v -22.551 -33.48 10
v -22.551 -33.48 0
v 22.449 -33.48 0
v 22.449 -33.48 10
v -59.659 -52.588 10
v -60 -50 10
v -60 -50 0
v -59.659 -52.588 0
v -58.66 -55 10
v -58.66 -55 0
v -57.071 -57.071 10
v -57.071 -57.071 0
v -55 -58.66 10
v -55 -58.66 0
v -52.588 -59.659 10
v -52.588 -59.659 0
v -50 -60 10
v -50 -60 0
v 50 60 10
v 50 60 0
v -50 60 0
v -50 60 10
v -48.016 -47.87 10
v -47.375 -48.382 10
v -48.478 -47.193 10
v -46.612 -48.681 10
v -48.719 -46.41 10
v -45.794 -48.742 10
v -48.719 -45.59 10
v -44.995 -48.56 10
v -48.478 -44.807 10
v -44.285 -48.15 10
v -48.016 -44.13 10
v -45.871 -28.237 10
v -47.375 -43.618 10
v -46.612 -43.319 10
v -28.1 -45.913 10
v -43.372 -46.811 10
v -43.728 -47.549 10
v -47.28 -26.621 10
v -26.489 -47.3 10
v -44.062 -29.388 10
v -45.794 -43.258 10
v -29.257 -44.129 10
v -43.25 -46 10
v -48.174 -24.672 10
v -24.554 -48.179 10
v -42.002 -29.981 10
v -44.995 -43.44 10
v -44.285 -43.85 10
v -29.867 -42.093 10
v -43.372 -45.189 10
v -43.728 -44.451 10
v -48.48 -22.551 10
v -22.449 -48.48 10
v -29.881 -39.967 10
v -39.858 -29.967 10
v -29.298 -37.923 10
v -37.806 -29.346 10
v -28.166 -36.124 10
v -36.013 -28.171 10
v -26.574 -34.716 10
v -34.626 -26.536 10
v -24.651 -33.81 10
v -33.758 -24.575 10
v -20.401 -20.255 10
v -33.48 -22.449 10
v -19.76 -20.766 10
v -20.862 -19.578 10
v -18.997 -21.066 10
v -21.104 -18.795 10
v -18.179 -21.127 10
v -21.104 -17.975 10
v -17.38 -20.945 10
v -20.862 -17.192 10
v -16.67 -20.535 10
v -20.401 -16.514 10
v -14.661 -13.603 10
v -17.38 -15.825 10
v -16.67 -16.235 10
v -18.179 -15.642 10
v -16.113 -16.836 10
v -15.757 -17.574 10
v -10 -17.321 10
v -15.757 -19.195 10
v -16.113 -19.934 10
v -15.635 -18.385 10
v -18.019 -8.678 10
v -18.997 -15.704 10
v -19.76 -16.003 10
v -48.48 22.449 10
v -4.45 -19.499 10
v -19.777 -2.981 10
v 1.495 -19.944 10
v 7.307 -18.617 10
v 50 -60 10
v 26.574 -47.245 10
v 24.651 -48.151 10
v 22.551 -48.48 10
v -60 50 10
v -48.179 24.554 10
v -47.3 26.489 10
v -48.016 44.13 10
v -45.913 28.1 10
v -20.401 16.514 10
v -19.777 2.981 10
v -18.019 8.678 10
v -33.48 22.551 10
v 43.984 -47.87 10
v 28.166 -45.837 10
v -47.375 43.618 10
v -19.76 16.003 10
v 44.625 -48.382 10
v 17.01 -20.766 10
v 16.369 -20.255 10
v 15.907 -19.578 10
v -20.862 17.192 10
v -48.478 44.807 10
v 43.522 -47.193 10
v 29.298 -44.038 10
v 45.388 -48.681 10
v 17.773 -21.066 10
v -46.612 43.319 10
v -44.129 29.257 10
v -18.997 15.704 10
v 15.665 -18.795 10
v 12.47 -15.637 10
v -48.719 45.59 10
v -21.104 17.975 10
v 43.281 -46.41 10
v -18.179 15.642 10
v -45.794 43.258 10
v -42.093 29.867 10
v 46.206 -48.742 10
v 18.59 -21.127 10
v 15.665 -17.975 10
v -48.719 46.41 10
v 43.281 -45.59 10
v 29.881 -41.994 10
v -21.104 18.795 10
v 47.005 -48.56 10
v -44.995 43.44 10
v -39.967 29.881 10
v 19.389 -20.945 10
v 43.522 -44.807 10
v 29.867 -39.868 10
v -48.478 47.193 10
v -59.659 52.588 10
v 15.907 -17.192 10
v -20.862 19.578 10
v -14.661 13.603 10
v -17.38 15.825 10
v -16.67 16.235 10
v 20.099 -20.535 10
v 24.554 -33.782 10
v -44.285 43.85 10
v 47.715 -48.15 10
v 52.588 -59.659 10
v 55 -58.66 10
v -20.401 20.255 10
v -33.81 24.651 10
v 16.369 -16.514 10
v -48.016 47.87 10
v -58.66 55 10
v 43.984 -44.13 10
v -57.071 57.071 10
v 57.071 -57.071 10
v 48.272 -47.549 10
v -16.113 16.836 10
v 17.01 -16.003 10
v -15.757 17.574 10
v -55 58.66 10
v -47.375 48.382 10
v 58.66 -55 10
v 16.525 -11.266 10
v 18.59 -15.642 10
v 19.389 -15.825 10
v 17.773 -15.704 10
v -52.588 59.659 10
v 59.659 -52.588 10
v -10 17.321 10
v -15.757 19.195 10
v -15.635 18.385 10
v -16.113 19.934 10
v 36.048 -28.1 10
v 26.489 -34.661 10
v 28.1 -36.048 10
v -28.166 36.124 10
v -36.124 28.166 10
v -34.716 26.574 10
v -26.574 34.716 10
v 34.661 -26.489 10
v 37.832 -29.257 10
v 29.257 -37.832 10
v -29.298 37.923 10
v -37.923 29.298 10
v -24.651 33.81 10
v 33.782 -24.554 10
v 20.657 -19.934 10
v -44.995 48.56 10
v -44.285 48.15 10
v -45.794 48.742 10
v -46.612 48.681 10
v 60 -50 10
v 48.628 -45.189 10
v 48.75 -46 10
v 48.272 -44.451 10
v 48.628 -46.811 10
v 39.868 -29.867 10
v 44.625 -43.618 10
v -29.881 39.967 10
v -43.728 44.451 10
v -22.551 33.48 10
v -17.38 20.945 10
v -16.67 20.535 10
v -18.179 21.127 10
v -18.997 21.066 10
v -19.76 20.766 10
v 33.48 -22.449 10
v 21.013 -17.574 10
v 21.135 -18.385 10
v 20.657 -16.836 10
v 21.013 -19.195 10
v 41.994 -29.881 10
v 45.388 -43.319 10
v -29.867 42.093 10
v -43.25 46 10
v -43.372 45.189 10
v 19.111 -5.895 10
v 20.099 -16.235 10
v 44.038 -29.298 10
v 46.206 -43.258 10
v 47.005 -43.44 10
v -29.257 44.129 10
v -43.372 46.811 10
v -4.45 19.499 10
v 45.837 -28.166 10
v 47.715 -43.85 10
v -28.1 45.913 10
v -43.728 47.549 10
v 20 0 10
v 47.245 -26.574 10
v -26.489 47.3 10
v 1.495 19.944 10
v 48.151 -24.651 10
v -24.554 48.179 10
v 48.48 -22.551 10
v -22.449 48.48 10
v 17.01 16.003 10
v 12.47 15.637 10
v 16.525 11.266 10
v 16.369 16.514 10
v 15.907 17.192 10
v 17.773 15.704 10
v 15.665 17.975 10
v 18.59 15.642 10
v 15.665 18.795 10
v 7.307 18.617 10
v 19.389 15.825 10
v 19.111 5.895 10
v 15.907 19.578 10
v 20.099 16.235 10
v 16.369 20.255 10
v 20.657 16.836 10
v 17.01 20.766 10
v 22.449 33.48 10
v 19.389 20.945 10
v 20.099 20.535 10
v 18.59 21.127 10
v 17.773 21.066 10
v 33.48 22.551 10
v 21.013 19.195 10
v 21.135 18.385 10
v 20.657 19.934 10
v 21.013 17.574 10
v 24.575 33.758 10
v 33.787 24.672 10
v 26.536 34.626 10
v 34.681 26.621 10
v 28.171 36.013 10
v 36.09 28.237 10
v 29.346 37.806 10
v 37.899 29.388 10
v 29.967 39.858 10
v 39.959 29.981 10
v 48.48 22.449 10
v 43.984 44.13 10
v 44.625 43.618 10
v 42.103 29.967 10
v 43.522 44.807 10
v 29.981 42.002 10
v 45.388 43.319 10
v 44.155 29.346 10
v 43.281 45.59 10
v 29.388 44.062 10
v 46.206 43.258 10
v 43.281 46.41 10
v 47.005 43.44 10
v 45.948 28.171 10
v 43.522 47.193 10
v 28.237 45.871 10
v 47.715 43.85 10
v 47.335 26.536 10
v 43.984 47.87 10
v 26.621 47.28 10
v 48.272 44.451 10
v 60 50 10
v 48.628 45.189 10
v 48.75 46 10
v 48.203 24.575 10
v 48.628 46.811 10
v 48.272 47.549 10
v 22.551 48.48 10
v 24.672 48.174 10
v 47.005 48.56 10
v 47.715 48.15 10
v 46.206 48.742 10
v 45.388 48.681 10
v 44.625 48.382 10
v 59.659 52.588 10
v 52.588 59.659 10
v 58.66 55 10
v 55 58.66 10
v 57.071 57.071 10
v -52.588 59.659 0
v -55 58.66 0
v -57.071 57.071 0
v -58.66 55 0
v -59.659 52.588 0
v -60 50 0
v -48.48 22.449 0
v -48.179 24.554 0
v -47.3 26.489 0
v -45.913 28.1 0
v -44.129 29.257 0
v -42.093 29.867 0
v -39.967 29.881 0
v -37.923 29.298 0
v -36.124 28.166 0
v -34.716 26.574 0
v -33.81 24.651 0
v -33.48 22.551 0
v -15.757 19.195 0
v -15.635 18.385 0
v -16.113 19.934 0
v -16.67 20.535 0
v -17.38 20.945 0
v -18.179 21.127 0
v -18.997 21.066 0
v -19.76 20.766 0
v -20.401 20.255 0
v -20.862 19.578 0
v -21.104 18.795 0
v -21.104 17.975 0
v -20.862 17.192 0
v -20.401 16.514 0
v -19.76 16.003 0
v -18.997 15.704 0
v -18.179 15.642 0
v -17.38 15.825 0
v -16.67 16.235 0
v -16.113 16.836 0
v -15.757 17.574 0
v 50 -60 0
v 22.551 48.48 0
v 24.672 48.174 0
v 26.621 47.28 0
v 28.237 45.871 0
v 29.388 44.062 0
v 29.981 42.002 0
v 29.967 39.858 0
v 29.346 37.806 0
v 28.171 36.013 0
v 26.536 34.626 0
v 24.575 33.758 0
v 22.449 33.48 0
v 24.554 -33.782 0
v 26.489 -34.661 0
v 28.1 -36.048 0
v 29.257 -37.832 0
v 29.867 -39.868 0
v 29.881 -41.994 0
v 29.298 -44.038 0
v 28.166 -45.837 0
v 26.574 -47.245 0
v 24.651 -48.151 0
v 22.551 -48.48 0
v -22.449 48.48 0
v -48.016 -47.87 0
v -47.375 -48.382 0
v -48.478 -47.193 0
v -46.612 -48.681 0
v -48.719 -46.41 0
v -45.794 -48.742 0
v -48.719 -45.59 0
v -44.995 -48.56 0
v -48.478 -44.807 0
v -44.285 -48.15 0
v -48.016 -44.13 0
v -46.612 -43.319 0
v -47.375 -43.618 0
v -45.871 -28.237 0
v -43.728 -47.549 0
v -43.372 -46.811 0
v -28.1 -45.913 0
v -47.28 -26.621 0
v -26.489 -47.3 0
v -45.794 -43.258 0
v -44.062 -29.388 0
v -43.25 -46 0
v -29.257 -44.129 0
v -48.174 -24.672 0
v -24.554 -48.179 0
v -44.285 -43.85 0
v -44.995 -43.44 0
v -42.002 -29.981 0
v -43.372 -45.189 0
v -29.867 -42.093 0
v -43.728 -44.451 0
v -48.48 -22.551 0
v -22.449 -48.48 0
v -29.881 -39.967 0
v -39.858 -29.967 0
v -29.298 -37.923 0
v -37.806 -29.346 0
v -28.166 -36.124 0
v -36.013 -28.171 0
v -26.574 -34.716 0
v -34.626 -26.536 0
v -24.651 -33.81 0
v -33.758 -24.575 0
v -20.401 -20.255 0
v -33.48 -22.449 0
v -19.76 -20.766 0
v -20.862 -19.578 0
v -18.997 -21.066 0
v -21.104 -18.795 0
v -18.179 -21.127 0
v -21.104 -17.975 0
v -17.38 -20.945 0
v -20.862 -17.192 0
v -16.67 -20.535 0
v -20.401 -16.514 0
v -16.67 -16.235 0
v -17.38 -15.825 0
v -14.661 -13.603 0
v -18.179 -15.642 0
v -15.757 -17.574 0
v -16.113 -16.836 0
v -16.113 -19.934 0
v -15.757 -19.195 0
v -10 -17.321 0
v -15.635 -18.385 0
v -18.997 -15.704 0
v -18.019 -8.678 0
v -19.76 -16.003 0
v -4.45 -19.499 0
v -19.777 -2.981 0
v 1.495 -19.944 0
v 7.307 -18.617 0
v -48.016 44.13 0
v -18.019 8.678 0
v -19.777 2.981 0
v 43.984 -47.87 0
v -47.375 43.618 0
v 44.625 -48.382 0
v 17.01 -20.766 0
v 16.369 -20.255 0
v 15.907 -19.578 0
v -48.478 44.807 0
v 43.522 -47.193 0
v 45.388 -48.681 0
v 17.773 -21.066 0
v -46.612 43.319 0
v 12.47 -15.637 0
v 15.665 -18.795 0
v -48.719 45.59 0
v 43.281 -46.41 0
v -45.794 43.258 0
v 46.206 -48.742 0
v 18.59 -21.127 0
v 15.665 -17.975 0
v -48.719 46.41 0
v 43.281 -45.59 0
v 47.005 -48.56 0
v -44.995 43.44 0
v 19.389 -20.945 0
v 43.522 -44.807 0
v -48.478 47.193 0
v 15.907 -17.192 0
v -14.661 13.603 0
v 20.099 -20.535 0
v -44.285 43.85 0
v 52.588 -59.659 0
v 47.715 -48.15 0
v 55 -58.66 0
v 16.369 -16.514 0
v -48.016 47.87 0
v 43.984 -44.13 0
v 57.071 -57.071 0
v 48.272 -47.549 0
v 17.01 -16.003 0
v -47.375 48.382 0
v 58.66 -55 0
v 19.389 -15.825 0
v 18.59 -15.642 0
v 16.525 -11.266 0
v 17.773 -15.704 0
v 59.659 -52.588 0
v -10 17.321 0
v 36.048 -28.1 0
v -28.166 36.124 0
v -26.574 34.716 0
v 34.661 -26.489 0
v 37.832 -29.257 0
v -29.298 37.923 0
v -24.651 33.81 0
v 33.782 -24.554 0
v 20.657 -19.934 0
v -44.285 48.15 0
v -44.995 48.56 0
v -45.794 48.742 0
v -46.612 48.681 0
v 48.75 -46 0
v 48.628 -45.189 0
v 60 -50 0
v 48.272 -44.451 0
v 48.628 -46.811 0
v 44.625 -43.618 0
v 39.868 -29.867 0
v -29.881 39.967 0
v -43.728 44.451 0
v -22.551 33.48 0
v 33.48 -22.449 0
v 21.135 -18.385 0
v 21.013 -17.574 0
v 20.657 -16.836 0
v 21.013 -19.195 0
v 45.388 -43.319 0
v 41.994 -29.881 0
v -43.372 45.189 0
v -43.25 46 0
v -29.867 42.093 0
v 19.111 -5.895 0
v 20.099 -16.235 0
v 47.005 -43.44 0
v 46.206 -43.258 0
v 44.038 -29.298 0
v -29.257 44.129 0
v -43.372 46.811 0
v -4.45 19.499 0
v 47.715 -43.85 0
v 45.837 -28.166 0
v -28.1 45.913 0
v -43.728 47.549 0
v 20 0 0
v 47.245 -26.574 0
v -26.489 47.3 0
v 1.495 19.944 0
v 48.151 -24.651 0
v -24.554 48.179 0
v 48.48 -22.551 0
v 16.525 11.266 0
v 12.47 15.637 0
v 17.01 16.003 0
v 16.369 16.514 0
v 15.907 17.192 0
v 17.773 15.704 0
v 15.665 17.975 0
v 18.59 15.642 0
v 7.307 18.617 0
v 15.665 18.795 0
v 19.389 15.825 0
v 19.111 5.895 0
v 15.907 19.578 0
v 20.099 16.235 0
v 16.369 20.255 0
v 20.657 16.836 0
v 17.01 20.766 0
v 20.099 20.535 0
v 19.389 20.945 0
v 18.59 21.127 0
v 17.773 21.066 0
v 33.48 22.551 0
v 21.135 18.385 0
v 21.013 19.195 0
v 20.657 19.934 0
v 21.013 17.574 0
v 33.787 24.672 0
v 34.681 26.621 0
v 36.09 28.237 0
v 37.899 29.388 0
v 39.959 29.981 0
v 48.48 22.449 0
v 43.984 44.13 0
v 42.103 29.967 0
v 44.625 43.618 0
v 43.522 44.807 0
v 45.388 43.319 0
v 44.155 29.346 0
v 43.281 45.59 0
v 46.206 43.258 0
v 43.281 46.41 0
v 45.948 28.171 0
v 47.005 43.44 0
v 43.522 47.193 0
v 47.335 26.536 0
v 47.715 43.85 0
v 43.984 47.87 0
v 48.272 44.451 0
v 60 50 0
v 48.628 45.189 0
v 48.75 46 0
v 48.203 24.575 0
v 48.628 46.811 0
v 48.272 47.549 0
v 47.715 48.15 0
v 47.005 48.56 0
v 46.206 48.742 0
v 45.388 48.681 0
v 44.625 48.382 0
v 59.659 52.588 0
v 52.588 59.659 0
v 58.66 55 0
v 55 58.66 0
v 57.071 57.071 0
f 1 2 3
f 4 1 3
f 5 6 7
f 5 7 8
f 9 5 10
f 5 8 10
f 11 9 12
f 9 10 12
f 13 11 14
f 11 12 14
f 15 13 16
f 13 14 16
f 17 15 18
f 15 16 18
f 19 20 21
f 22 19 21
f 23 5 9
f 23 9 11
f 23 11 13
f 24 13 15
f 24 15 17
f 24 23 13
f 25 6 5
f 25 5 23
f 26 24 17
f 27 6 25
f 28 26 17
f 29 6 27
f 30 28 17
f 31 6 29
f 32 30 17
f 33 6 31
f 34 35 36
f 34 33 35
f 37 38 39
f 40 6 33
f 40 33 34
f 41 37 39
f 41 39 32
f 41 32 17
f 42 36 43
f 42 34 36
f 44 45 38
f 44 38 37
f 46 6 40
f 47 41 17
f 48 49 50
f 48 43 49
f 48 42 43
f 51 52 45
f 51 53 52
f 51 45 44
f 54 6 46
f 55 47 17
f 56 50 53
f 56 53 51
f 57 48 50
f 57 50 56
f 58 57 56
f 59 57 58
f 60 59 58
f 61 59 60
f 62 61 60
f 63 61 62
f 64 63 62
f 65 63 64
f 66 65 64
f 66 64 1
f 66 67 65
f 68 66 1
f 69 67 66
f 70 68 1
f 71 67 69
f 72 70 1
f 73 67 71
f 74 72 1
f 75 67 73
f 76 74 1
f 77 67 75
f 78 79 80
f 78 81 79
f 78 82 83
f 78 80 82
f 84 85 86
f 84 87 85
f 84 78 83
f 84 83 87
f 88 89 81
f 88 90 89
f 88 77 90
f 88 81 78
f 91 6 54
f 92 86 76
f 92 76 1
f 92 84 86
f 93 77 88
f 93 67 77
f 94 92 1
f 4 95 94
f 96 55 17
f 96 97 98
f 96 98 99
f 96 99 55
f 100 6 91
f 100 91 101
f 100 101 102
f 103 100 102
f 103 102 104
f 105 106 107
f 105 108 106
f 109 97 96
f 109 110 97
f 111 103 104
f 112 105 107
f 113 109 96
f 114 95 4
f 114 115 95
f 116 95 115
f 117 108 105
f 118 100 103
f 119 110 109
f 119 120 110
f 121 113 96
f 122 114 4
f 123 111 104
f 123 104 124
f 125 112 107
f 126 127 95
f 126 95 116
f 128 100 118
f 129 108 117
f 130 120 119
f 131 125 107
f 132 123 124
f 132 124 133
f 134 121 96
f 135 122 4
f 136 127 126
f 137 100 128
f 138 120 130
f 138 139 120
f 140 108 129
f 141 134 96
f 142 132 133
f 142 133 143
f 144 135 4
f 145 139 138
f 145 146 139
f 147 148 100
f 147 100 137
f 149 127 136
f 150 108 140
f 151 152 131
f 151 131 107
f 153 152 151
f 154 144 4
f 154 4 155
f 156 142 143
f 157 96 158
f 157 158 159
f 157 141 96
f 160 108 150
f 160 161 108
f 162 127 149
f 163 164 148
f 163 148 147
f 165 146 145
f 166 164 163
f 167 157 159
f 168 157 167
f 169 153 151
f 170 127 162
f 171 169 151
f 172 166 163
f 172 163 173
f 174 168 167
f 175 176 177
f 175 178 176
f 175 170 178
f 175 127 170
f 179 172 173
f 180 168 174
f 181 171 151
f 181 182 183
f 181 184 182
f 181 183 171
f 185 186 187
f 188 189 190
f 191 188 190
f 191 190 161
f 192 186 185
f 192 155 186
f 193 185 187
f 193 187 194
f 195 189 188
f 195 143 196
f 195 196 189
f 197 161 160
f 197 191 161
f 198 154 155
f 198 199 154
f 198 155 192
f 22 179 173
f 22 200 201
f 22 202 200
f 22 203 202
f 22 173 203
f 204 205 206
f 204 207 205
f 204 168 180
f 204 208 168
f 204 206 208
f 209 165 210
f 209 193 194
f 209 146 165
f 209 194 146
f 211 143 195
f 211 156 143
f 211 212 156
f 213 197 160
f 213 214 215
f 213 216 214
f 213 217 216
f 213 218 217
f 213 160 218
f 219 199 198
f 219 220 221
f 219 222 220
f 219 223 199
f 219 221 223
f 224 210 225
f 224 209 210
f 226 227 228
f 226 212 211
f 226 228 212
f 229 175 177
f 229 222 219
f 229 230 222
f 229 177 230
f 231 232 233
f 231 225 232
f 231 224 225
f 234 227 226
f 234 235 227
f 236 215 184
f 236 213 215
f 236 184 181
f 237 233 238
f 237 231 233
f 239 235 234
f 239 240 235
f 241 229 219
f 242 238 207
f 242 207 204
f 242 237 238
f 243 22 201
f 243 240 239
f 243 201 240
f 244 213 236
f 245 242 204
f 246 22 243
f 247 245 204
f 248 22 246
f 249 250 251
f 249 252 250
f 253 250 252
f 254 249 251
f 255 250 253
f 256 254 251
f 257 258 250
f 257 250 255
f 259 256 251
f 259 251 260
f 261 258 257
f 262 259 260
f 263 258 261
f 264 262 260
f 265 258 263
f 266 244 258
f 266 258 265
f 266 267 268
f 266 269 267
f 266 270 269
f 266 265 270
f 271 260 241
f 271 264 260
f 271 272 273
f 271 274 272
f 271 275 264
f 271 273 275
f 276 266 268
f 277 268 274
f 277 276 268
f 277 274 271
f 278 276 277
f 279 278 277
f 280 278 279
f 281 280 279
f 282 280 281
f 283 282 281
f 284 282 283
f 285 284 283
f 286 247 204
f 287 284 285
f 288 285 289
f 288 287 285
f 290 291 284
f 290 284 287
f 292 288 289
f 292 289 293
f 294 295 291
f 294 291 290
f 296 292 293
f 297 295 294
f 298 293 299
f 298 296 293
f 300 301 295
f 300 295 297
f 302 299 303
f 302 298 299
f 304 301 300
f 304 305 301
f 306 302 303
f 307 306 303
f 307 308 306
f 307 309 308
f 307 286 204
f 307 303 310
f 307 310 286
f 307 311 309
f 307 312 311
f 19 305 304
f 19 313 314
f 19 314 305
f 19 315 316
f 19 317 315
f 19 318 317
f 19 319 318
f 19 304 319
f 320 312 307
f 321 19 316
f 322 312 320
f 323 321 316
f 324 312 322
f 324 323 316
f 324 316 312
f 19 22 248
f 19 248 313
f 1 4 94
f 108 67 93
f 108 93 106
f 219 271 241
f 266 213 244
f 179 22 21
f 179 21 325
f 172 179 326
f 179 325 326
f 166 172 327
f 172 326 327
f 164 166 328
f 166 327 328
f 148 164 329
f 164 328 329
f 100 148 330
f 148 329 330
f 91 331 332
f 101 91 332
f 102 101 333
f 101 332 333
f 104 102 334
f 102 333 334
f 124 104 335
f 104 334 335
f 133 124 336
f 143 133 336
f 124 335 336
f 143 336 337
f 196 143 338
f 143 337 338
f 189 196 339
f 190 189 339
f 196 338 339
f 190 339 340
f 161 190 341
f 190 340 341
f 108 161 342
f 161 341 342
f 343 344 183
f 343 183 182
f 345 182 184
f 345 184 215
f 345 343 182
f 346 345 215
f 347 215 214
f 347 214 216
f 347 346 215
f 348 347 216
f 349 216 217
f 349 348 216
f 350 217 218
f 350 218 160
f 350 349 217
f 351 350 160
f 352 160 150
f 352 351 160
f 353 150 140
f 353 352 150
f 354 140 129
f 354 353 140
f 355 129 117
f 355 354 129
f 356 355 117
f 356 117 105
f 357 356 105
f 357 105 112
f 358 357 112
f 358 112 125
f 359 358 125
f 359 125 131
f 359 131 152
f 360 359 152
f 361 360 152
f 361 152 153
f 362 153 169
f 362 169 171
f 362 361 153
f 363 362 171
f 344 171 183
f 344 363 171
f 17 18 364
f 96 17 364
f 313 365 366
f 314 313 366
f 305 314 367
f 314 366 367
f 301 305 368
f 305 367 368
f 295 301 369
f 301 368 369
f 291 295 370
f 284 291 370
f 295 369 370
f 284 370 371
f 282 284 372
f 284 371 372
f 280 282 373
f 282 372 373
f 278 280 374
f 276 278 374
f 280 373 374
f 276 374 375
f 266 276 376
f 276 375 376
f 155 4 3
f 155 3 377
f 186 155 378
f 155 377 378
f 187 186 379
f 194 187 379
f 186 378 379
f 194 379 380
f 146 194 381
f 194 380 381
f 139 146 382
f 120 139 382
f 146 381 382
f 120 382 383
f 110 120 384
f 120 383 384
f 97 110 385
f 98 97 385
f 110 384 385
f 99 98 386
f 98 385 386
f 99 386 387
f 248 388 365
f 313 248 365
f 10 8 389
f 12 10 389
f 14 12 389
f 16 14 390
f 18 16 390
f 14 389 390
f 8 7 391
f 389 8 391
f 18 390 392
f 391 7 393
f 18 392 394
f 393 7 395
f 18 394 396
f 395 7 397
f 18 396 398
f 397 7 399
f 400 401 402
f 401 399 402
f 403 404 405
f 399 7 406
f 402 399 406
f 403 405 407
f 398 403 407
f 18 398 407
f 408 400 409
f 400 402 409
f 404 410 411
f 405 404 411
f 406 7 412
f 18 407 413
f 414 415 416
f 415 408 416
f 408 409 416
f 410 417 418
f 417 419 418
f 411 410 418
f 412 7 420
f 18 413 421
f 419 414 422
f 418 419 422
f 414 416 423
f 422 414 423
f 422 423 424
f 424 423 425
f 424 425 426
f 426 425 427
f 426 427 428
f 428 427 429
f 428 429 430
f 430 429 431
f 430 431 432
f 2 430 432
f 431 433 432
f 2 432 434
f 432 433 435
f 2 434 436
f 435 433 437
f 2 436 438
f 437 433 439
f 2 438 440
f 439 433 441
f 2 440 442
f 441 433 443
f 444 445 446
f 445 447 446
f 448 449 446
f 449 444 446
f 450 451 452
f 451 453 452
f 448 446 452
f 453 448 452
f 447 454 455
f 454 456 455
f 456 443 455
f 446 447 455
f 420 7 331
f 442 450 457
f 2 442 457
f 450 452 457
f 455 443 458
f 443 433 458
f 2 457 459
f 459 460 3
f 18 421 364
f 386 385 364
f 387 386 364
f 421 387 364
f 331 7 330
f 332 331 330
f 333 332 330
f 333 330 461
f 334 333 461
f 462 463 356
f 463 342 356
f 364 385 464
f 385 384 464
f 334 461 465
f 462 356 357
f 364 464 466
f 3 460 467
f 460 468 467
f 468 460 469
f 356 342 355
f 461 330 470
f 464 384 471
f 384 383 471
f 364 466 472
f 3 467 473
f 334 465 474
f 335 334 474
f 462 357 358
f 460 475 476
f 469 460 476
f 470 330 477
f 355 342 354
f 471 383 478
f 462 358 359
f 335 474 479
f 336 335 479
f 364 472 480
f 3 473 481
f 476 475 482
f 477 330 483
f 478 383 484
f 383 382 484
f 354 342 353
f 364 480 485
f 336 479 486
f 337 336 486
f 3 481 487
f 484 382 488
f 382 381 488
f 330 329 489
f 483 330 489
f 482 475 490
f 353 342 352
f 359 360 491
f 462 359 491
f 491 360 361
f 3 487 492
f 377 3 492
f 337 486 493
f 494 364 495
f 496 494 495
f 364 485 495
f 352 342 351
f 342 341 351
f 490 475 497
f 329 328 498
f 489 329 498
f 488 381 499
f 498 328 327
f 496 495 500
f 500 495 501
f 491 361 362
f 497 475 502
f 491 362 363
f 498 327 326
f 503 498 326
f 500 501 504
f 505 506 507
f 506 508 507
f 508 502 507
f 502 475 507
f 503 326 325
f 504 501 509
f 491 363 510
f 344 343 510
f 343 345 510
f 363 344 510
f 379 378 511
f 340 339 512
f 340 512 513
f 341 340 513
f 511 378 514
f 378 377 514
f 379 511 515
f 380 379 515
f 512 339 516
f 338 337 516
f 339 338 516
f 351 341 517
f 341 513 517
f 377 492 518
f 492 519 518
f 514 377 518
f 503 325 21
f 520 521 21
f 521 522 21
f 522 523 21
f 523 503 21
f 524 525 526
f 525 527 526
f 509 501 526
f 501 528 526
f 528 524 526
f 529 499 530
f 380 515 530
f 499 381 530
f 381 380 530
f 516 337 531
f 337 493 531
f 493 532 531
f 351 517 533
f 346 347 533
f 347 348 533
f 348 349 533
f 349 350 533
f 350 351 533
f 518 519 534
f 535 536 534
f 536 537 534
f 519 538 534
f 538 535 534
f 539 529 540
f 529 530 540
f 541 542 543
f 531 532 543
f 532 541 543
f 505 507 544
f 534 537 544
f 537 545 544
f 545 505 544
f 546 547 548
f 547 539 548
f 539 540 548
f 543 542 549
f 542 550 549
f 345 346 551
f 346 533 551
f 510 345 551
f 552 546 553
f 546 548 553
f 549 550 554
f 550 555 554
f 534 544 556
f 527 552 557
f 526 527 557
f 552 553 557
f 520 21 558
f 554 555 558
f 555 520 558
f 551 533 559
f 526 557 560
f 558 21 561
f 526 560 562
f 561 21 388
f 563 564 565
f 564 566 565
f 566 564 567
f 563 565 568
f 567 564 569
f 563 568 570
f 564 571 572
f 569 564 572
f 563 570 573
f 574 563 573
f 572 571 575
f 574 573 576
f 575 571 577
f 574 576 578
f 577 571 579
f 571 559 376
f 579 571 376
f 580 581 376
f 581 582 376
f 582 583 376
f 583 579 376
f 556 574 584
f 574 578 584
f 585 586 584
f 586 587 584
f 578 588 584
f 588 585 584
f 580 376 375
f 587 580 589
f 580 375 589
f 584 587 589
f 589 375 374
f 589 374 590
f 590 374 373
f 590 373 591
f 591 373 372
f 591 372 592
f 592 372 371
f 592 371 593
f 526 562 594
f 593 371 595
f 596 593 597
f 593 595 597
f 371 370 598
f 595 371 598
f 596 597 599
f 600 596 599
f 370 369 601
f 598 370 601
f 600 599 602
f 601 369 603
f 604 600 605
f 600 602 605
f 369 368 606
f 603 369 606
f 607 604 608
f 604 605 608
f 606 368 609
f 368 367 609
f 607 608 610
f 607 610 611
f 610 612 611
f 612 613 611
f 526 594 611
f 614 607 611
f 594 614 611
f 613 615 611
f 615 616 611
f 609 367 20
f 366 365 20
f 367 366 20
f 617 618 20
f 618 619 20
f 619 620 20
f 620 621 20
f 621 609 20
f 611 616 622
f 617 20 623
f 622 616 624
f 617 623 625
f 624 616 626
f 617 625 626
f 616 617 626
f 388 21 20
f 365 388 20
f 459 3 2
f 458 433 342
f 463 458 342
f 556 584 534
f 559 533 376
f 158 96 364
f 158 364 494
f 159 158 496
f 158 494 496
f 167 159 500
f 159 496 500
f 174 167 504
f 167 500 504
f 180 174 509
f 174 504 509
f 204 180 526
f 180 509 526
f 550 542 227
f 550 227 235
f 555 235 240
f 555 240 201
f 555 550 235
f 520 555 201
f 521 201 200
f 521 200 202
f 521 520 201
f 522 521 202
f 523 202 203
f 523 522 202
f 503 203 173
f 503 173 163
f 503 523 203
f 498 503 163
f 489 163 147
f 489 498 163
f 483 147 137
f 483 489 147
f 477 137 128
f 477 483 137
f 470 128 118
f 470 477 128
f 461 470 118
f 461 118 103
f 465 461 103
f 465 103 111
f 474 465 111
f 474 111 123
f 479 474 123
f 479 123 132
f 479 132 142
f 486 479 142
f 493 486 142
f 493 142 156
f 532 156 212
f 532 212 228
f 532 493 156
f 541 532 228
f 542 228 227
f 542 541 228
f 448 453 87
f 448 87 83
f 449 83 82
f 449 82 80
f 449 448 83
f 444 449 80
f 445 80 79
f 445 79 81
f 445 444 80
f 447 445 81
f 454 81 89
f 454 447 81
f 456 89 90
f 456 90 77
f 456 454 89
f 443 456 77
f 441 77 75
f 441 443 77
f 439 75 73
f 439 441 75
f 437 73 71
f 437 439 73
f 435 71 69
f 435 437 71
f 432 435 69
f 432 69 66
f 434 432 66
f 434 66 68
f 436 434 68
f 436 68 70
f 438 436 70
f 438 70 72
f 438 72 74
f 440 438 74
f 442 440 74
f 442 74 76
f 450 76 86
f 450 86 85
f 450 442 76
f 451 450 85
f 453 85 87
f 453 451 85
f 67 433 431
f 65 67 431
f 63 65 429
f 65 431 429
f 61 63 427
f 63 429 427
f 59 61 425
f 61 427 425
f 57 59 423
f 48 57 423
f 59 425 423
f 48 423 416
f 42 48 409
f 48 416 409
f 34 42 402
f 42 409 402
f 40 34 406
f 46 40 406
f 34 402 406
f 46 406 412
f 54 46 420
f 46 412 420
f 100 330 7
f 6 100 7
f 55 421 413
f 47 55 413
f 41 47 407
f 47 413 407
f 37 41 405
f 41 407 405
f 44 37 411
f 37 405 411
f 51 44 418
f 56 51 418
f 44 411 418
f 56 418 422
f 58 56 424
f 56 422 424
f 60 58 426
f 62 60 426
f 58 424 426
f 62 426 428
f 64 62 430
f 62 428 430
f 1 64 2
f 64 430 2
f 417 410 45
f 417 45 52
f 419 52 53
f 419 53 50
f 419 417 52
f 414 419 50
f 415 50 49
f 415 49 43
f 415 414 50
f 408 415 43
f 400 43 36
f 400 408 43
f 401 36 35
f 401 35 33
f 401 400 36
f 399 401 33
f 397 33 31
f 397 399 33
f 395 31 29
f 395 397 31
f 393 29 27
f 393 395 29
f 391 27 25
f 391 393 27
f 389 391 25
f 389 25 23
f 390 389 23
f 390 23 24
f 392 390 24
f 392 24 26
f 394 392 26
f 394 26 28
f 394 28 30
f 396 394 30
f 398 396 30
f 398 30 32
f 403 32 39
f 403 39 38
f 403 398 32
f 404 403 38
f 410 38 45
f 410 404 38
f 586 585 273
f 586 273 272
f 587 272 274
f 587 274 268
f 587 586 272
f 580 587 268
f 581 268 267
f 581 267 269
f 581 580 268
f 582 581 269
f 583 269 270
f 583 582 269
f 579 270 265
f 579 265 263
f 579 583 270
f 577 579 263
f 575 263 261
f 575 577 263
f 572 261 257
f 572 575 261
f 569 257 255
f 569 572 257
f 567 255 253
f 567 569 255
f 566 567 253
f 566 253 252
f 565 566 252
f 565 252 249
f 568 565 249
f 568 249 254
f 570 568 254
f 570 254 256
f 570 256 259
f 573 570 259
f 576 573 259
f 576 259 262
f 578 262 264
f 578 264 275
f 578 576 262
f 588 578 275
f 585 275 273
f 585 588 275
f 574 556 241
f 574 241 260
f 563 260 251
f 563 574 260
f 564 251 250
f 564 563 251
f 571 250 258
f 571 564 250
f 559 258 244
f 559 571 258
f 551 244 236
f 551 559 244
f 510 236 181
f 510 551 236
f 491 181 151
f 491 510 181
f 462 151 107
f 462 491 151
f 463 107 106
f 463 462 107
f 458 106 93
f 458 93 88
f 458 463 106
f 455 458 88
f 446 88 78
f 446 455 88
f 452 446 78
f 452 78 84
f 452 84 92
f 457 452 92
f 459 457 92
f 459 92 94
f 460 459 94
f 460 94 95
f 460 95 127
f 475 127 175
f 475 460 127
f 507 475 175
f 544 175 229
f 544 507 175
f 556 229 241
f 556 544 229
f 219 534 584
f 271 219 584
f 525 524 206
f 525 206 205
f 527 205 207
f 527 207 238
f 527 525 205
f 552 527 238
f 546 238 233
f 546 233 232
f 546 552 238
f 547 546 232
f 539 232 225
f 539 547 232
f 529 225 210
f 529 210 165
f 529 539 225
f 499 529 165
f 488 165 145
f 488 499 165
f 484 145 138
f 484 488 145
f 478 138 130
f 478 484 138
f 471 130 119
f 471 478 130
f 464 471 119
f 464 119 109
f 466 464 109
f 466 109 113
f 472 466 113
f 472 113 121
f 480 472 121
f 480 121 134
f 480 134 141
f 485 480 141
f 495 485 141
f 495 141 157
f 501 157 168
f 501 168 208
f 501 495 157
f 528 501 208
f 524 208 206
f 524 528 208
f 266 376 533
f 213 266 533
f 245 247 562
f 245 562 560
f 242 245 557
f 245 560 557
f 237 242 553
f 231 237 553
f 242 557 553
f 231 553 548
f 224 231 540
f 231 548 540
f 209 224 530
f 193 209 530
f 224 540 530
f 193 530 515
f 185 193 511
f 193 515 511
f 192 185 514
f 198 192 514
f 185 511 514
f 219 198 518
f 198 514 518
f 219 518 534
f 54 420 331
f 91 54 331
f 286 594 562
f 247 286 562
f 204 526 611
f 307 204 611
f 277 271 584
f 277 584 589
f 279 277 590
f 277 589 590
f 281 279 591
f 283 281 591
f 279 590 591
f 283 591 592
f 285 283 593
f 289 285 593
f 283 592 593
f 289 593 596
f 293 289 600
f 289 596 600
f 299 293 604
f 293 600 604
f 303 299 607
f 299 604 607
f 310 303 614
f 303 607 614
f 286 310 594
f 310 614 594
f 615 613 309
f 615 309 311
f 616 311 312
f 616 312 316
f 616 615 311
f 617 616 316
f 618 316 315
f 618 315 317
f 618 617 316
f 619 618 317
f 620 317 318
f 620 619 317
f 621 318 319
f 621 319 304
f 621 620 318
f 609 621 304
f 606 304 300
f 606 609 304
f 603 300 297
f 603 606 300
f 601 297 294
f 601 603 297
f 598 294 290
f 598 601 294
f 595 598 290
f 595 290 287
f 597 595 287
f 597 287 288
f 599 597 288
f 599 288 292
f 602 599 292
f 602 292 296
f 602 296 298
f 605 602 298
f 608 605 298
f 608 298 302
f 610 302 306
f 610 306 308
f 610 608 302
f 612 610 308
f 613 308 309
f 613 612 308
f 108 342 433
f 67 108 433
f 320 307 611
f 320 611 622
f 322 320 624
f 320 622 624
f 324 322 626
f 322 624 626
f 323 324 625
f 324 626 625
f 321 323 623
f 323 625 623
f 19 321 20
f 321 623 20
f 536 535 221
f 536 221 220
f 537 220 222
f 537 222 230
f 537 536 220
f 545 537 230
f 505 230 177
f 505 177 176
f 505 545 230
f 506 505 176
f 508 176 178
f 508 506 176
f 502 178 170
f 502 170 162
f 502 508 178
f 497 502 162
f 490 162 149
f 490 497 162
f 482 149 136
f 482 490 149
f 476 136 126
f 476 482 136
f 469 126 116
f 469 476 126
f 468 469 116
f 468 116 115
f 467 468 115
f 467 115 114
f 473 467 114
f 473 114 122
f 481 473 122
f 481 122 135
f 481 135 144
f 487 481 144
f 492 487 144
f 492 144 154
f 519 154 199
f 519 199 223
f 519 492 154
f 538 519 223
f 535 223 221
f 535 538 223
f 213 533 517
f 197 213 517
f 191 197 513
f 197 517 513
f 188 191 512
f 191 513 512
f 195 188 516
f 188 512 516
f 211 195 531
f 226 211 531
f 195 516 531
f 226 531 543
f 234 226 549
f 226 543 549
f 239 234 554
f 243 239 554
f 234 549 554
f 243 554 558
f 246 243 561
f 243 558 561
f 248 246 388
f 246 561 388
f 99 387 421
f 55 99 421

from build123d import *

# Parameters (mm, degrees)
F0_R     = 2.75
F0_R_2   = 20
F1_DEPTH = 10


with BuildPart() as f1:
    # F0 (on Top) → F1 (new body)
    with BuildSketch(Plane.XY):
        with BuildLine():
            Line((-50, -60), (50, -60))
            ThreePointArc((50, -60), (57.071068, -57.071068), (60, -50))
            Line((60, -50), (60, 50))
            ThreePointArc((60, 50), (57.071068, 57.071068), (50, 60))
            Line((50, 60), (-50, 60))
            ThreePointArc((-50, 60), (-57.071068, 57.071068), (-60, 50))
            Line((-60, 50), (-60, -50))
            ThreePointArc((-60, -50), (-57.071068, -57.071068), (-50, -60))
        make_face()
        with Locations((-46, -46)):
            Circle(F0_R, mode=Mode.SUBTRACT)
        with BuildLine():
            Line((-33.480436, 22.550578), (-33.480436, -22.449422))
            ThreePointArc((-33.480436, -22.449422), (-40.929516, -30.050748), (-48.480436, -22.550578))
            Line((-48.480436, -22.550578), (-48.480436, 22.449422))
            ThreePointArc((-48.480436, 22.449422), (-41.030674, 29.949593), (-33.480436, 22.550578))
        make_face(mode=Mode.SUBTRACT)
        with Locations((-18.384776, -18.384776)):
            Circle(F0_R, mode=Mode.SUBTRACT)
        with BuildLine():
            Line((-22.550578, -33.480436), (22.449422, -33.480436))
            ThreePointArc((22.449422, -33.480436), (29.949593, -40.930199), (22.550578, -48.480436))
            Line((22.550578, -48.480436), (-22.449422, -48.480436))
            ThreePointArc((-22.449422, -48.480436), (-29.949593, -41.030674), (-22.550578, -33.480436))
        make_face(mode=Mode.SUBTRACT)
        with Locations((46, -46)):
            Circle(F0_R, mode=Mode.SUBTRACT)
        with Locations((18.384776, -18.384776)):
            Circle(F0_R, mode=Mode.SUBTRACT)
        with Locations((-18.384776, 18.384776)):
            Circle(F0_R, mode=Mode.SUBTRACT)
        with Locations((-46, 46)):
            Circle(F0_R, mode=Mode.SUBTRACT)
        Circle(F0_R_2, mode=Mode.SUBTRACT)
        with Locations((18.384776, 18.384776)):
            Circle(F0_R, mode=Mode.SUBTRACT)
        with BuildLine():
            Line((48.480436, 22.449422), (48.480436, -22.550578))
            ThreePointArc((48.480436, -22.550578), (40.930199, -29.949593), (33.480436, -22.449422))
            Line((33.480436, -22.449422), (33.480436, 22.550578))
            ThreePointArc((33.480436, 22.550578), (41.031356, 30.050748), (48.480436, 22.449422))
        make_face(mode=Mode.SUBTRACT)
        with BuildLine():
            ThreePointArc((22.550578, 48.480436), (30.050748, 40.929516), (22.449422, 33.480436))
            Line((22.449422, 33.480436), (-22.550578, 33.480436))
            ThreePointArc((-22.550578, 33.480436), (-29.949593, 41.030674), (-22.449422, 48.480436))
            Line((-22.449422, 48.480436), (22.550578, 48.480436))
        make_face(mode=Mode.SUBTRACT)
        with Locations((46, 46)):
            Circle(F0_R, mode=Mode.SUBTRACT)
    extrude(amount=F1_DEPTH)


solid = f1.part
